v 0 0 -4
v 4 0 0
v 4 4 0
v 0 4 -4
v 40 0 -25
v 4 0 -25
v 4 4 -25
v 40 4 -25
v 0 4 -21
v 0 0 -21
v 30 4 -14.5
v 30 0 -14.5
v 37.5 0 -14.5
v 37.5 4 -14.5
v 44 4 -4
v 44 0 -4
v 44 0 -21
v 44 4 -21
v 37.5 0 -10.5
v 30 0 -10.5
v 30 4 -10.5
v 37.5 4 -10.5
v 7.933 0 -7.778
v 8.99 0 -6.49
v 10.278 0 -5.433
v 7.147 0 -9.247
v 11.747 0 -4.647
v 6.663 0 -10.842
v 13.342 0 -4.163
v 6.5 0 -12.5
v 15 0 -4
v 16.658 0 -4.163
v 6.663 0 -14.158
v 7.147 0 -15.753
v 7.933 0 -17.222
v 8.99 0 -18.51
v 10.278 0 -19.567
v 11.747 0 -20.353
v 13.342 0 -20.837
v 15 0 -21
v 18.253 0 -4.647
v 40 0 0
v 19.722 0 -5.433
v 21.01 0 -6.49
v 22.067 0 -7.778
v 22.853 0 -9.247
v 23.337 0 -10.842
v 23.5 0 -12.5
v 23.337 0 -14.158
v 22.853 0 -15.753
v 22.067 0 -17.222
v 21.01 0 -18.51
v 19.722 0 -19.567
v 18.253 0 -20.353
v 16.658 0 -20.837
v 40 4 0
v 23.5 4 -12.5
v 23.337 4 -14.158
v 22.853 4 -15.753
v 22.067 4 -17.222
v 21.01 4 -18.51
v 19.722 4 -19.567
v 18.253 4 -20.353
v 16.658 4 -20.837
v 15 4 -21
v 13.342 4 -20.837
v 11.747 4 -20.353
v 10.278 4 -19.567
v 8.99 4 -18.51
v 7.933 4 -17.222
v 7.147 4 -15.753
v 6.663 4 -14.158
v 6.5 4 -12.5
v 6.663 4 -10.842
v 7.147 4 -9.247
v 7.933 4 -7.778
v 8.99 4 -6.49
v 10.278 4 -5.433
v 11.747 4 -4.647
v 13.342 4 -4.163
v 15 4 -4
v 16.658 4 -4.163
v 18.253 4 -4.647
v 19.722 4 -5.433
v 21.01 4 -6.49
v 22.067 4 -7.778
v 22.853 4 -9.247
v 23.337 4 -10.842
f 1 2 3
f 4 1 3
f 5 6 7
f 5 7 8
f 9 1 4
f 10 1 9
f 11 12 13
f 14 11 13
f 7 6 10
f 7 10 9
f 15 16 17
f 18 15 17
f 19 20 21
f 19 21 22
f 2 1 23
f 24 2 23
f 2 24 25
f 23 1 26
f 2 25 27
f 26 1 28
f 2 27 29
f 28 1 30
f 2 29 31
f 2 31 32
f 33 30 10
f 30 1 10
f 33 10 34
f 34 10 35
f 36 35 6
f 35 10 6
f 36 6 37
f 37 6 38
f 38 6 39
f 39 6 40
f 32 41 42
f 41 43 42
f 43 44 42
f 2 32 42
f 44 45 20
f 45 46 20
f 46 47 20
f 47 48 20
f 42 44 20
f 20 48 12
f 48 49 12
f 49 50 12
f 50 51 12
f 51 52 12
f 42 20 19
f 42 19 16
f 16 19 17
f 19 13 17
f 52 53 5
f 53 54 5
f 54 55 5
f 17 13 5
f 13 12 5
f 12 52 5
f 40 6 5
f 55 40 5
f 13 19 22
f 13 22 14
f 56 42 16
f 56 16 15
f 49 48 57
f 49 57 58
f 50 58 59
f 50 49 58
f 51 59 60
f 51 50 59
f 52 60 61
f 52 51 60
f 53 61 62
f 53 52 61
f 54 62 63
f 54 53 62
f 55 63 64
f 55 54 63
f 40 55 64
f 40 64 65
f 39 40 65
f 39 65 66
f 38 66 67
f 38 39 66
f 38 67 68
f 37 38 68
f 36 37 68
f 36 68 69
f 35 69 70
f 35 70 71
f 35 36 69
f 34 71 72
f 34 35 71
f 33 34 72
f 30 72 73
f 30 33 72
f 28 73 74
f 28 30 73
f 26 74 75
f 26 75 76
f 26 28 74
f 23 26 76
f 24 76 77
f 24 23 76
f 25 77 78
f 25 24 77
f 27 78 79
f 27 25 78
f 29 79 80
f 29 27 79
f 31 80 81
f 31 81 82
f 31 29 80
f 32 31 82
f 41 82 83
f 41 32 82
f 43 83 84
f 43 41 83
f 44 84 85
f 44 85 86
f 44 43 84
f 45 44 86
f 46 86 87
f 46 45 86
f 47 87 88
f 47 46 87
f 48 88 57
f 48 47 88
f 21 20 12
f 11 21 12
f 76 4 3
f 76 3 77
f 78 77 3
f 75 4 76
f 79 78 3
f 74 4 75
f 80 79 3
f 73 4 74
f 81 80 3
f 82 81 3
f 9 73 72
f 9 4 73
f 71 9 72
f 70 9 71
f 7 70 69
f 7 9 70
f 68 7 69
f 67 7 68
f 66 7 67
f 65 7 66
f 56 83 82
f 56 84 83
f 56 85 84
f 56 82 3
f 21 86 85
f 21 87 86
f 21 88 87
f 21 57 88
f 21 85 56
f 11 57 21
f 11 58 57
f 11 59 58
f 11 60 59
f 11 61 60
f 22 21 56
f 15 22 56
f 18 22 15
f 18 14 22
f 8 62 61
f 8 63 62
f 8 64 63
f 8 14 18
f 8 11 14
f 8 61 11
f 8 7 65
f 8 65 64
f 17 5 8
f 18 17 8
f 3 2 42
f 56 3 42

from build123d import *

# Parameters (mm, degrees)
SKETCH1_W           = 44
SKETCH1_H           = 25
SKETCH1_R           = 8.5
SKETCH1_W_2         = 7.5
SKETCH1_H_2         = 4
BOSS_EXTRUDE1_DEPTH = 4
CHAMFER1_SIZE       = 4


with BuildPart() as part:
    # Sketch1 → Boss-Extrude1 (new body)
    with BuildSketch(Plane(origin=(0, 0, 0), x_dir=(1, 0, 0), z_dir=(0, 1, 0))):
        with Locations((22, 12.5)):
            Rectangle(SKETCH1_W, SKETCH1_H)
        with Locations((15, 12.5)):
            Circle(SKETCH1_R, mode=Mode.SUBTRACT)
        with Locations((33.75, 12.5)):
            Rectangle(SKETCH1_W_2, SKETCH1_H_2, mode=Mode.SUBTRACT)
    extrude(amount=BOSS_EXTRUDE1_DEPTH)

    # Chamfer1
    chamfer1_edges = [part.edges().sort_by_distance(p)[0] for p in [
        (0, 2, -25),
        (44, 2, -25),
        (44, 2, 0),
        (0, 2, 0),
    ]]
    chamfer(chamfer1_edges, length=CHAMFER1_SIZE)


solid = part.part
